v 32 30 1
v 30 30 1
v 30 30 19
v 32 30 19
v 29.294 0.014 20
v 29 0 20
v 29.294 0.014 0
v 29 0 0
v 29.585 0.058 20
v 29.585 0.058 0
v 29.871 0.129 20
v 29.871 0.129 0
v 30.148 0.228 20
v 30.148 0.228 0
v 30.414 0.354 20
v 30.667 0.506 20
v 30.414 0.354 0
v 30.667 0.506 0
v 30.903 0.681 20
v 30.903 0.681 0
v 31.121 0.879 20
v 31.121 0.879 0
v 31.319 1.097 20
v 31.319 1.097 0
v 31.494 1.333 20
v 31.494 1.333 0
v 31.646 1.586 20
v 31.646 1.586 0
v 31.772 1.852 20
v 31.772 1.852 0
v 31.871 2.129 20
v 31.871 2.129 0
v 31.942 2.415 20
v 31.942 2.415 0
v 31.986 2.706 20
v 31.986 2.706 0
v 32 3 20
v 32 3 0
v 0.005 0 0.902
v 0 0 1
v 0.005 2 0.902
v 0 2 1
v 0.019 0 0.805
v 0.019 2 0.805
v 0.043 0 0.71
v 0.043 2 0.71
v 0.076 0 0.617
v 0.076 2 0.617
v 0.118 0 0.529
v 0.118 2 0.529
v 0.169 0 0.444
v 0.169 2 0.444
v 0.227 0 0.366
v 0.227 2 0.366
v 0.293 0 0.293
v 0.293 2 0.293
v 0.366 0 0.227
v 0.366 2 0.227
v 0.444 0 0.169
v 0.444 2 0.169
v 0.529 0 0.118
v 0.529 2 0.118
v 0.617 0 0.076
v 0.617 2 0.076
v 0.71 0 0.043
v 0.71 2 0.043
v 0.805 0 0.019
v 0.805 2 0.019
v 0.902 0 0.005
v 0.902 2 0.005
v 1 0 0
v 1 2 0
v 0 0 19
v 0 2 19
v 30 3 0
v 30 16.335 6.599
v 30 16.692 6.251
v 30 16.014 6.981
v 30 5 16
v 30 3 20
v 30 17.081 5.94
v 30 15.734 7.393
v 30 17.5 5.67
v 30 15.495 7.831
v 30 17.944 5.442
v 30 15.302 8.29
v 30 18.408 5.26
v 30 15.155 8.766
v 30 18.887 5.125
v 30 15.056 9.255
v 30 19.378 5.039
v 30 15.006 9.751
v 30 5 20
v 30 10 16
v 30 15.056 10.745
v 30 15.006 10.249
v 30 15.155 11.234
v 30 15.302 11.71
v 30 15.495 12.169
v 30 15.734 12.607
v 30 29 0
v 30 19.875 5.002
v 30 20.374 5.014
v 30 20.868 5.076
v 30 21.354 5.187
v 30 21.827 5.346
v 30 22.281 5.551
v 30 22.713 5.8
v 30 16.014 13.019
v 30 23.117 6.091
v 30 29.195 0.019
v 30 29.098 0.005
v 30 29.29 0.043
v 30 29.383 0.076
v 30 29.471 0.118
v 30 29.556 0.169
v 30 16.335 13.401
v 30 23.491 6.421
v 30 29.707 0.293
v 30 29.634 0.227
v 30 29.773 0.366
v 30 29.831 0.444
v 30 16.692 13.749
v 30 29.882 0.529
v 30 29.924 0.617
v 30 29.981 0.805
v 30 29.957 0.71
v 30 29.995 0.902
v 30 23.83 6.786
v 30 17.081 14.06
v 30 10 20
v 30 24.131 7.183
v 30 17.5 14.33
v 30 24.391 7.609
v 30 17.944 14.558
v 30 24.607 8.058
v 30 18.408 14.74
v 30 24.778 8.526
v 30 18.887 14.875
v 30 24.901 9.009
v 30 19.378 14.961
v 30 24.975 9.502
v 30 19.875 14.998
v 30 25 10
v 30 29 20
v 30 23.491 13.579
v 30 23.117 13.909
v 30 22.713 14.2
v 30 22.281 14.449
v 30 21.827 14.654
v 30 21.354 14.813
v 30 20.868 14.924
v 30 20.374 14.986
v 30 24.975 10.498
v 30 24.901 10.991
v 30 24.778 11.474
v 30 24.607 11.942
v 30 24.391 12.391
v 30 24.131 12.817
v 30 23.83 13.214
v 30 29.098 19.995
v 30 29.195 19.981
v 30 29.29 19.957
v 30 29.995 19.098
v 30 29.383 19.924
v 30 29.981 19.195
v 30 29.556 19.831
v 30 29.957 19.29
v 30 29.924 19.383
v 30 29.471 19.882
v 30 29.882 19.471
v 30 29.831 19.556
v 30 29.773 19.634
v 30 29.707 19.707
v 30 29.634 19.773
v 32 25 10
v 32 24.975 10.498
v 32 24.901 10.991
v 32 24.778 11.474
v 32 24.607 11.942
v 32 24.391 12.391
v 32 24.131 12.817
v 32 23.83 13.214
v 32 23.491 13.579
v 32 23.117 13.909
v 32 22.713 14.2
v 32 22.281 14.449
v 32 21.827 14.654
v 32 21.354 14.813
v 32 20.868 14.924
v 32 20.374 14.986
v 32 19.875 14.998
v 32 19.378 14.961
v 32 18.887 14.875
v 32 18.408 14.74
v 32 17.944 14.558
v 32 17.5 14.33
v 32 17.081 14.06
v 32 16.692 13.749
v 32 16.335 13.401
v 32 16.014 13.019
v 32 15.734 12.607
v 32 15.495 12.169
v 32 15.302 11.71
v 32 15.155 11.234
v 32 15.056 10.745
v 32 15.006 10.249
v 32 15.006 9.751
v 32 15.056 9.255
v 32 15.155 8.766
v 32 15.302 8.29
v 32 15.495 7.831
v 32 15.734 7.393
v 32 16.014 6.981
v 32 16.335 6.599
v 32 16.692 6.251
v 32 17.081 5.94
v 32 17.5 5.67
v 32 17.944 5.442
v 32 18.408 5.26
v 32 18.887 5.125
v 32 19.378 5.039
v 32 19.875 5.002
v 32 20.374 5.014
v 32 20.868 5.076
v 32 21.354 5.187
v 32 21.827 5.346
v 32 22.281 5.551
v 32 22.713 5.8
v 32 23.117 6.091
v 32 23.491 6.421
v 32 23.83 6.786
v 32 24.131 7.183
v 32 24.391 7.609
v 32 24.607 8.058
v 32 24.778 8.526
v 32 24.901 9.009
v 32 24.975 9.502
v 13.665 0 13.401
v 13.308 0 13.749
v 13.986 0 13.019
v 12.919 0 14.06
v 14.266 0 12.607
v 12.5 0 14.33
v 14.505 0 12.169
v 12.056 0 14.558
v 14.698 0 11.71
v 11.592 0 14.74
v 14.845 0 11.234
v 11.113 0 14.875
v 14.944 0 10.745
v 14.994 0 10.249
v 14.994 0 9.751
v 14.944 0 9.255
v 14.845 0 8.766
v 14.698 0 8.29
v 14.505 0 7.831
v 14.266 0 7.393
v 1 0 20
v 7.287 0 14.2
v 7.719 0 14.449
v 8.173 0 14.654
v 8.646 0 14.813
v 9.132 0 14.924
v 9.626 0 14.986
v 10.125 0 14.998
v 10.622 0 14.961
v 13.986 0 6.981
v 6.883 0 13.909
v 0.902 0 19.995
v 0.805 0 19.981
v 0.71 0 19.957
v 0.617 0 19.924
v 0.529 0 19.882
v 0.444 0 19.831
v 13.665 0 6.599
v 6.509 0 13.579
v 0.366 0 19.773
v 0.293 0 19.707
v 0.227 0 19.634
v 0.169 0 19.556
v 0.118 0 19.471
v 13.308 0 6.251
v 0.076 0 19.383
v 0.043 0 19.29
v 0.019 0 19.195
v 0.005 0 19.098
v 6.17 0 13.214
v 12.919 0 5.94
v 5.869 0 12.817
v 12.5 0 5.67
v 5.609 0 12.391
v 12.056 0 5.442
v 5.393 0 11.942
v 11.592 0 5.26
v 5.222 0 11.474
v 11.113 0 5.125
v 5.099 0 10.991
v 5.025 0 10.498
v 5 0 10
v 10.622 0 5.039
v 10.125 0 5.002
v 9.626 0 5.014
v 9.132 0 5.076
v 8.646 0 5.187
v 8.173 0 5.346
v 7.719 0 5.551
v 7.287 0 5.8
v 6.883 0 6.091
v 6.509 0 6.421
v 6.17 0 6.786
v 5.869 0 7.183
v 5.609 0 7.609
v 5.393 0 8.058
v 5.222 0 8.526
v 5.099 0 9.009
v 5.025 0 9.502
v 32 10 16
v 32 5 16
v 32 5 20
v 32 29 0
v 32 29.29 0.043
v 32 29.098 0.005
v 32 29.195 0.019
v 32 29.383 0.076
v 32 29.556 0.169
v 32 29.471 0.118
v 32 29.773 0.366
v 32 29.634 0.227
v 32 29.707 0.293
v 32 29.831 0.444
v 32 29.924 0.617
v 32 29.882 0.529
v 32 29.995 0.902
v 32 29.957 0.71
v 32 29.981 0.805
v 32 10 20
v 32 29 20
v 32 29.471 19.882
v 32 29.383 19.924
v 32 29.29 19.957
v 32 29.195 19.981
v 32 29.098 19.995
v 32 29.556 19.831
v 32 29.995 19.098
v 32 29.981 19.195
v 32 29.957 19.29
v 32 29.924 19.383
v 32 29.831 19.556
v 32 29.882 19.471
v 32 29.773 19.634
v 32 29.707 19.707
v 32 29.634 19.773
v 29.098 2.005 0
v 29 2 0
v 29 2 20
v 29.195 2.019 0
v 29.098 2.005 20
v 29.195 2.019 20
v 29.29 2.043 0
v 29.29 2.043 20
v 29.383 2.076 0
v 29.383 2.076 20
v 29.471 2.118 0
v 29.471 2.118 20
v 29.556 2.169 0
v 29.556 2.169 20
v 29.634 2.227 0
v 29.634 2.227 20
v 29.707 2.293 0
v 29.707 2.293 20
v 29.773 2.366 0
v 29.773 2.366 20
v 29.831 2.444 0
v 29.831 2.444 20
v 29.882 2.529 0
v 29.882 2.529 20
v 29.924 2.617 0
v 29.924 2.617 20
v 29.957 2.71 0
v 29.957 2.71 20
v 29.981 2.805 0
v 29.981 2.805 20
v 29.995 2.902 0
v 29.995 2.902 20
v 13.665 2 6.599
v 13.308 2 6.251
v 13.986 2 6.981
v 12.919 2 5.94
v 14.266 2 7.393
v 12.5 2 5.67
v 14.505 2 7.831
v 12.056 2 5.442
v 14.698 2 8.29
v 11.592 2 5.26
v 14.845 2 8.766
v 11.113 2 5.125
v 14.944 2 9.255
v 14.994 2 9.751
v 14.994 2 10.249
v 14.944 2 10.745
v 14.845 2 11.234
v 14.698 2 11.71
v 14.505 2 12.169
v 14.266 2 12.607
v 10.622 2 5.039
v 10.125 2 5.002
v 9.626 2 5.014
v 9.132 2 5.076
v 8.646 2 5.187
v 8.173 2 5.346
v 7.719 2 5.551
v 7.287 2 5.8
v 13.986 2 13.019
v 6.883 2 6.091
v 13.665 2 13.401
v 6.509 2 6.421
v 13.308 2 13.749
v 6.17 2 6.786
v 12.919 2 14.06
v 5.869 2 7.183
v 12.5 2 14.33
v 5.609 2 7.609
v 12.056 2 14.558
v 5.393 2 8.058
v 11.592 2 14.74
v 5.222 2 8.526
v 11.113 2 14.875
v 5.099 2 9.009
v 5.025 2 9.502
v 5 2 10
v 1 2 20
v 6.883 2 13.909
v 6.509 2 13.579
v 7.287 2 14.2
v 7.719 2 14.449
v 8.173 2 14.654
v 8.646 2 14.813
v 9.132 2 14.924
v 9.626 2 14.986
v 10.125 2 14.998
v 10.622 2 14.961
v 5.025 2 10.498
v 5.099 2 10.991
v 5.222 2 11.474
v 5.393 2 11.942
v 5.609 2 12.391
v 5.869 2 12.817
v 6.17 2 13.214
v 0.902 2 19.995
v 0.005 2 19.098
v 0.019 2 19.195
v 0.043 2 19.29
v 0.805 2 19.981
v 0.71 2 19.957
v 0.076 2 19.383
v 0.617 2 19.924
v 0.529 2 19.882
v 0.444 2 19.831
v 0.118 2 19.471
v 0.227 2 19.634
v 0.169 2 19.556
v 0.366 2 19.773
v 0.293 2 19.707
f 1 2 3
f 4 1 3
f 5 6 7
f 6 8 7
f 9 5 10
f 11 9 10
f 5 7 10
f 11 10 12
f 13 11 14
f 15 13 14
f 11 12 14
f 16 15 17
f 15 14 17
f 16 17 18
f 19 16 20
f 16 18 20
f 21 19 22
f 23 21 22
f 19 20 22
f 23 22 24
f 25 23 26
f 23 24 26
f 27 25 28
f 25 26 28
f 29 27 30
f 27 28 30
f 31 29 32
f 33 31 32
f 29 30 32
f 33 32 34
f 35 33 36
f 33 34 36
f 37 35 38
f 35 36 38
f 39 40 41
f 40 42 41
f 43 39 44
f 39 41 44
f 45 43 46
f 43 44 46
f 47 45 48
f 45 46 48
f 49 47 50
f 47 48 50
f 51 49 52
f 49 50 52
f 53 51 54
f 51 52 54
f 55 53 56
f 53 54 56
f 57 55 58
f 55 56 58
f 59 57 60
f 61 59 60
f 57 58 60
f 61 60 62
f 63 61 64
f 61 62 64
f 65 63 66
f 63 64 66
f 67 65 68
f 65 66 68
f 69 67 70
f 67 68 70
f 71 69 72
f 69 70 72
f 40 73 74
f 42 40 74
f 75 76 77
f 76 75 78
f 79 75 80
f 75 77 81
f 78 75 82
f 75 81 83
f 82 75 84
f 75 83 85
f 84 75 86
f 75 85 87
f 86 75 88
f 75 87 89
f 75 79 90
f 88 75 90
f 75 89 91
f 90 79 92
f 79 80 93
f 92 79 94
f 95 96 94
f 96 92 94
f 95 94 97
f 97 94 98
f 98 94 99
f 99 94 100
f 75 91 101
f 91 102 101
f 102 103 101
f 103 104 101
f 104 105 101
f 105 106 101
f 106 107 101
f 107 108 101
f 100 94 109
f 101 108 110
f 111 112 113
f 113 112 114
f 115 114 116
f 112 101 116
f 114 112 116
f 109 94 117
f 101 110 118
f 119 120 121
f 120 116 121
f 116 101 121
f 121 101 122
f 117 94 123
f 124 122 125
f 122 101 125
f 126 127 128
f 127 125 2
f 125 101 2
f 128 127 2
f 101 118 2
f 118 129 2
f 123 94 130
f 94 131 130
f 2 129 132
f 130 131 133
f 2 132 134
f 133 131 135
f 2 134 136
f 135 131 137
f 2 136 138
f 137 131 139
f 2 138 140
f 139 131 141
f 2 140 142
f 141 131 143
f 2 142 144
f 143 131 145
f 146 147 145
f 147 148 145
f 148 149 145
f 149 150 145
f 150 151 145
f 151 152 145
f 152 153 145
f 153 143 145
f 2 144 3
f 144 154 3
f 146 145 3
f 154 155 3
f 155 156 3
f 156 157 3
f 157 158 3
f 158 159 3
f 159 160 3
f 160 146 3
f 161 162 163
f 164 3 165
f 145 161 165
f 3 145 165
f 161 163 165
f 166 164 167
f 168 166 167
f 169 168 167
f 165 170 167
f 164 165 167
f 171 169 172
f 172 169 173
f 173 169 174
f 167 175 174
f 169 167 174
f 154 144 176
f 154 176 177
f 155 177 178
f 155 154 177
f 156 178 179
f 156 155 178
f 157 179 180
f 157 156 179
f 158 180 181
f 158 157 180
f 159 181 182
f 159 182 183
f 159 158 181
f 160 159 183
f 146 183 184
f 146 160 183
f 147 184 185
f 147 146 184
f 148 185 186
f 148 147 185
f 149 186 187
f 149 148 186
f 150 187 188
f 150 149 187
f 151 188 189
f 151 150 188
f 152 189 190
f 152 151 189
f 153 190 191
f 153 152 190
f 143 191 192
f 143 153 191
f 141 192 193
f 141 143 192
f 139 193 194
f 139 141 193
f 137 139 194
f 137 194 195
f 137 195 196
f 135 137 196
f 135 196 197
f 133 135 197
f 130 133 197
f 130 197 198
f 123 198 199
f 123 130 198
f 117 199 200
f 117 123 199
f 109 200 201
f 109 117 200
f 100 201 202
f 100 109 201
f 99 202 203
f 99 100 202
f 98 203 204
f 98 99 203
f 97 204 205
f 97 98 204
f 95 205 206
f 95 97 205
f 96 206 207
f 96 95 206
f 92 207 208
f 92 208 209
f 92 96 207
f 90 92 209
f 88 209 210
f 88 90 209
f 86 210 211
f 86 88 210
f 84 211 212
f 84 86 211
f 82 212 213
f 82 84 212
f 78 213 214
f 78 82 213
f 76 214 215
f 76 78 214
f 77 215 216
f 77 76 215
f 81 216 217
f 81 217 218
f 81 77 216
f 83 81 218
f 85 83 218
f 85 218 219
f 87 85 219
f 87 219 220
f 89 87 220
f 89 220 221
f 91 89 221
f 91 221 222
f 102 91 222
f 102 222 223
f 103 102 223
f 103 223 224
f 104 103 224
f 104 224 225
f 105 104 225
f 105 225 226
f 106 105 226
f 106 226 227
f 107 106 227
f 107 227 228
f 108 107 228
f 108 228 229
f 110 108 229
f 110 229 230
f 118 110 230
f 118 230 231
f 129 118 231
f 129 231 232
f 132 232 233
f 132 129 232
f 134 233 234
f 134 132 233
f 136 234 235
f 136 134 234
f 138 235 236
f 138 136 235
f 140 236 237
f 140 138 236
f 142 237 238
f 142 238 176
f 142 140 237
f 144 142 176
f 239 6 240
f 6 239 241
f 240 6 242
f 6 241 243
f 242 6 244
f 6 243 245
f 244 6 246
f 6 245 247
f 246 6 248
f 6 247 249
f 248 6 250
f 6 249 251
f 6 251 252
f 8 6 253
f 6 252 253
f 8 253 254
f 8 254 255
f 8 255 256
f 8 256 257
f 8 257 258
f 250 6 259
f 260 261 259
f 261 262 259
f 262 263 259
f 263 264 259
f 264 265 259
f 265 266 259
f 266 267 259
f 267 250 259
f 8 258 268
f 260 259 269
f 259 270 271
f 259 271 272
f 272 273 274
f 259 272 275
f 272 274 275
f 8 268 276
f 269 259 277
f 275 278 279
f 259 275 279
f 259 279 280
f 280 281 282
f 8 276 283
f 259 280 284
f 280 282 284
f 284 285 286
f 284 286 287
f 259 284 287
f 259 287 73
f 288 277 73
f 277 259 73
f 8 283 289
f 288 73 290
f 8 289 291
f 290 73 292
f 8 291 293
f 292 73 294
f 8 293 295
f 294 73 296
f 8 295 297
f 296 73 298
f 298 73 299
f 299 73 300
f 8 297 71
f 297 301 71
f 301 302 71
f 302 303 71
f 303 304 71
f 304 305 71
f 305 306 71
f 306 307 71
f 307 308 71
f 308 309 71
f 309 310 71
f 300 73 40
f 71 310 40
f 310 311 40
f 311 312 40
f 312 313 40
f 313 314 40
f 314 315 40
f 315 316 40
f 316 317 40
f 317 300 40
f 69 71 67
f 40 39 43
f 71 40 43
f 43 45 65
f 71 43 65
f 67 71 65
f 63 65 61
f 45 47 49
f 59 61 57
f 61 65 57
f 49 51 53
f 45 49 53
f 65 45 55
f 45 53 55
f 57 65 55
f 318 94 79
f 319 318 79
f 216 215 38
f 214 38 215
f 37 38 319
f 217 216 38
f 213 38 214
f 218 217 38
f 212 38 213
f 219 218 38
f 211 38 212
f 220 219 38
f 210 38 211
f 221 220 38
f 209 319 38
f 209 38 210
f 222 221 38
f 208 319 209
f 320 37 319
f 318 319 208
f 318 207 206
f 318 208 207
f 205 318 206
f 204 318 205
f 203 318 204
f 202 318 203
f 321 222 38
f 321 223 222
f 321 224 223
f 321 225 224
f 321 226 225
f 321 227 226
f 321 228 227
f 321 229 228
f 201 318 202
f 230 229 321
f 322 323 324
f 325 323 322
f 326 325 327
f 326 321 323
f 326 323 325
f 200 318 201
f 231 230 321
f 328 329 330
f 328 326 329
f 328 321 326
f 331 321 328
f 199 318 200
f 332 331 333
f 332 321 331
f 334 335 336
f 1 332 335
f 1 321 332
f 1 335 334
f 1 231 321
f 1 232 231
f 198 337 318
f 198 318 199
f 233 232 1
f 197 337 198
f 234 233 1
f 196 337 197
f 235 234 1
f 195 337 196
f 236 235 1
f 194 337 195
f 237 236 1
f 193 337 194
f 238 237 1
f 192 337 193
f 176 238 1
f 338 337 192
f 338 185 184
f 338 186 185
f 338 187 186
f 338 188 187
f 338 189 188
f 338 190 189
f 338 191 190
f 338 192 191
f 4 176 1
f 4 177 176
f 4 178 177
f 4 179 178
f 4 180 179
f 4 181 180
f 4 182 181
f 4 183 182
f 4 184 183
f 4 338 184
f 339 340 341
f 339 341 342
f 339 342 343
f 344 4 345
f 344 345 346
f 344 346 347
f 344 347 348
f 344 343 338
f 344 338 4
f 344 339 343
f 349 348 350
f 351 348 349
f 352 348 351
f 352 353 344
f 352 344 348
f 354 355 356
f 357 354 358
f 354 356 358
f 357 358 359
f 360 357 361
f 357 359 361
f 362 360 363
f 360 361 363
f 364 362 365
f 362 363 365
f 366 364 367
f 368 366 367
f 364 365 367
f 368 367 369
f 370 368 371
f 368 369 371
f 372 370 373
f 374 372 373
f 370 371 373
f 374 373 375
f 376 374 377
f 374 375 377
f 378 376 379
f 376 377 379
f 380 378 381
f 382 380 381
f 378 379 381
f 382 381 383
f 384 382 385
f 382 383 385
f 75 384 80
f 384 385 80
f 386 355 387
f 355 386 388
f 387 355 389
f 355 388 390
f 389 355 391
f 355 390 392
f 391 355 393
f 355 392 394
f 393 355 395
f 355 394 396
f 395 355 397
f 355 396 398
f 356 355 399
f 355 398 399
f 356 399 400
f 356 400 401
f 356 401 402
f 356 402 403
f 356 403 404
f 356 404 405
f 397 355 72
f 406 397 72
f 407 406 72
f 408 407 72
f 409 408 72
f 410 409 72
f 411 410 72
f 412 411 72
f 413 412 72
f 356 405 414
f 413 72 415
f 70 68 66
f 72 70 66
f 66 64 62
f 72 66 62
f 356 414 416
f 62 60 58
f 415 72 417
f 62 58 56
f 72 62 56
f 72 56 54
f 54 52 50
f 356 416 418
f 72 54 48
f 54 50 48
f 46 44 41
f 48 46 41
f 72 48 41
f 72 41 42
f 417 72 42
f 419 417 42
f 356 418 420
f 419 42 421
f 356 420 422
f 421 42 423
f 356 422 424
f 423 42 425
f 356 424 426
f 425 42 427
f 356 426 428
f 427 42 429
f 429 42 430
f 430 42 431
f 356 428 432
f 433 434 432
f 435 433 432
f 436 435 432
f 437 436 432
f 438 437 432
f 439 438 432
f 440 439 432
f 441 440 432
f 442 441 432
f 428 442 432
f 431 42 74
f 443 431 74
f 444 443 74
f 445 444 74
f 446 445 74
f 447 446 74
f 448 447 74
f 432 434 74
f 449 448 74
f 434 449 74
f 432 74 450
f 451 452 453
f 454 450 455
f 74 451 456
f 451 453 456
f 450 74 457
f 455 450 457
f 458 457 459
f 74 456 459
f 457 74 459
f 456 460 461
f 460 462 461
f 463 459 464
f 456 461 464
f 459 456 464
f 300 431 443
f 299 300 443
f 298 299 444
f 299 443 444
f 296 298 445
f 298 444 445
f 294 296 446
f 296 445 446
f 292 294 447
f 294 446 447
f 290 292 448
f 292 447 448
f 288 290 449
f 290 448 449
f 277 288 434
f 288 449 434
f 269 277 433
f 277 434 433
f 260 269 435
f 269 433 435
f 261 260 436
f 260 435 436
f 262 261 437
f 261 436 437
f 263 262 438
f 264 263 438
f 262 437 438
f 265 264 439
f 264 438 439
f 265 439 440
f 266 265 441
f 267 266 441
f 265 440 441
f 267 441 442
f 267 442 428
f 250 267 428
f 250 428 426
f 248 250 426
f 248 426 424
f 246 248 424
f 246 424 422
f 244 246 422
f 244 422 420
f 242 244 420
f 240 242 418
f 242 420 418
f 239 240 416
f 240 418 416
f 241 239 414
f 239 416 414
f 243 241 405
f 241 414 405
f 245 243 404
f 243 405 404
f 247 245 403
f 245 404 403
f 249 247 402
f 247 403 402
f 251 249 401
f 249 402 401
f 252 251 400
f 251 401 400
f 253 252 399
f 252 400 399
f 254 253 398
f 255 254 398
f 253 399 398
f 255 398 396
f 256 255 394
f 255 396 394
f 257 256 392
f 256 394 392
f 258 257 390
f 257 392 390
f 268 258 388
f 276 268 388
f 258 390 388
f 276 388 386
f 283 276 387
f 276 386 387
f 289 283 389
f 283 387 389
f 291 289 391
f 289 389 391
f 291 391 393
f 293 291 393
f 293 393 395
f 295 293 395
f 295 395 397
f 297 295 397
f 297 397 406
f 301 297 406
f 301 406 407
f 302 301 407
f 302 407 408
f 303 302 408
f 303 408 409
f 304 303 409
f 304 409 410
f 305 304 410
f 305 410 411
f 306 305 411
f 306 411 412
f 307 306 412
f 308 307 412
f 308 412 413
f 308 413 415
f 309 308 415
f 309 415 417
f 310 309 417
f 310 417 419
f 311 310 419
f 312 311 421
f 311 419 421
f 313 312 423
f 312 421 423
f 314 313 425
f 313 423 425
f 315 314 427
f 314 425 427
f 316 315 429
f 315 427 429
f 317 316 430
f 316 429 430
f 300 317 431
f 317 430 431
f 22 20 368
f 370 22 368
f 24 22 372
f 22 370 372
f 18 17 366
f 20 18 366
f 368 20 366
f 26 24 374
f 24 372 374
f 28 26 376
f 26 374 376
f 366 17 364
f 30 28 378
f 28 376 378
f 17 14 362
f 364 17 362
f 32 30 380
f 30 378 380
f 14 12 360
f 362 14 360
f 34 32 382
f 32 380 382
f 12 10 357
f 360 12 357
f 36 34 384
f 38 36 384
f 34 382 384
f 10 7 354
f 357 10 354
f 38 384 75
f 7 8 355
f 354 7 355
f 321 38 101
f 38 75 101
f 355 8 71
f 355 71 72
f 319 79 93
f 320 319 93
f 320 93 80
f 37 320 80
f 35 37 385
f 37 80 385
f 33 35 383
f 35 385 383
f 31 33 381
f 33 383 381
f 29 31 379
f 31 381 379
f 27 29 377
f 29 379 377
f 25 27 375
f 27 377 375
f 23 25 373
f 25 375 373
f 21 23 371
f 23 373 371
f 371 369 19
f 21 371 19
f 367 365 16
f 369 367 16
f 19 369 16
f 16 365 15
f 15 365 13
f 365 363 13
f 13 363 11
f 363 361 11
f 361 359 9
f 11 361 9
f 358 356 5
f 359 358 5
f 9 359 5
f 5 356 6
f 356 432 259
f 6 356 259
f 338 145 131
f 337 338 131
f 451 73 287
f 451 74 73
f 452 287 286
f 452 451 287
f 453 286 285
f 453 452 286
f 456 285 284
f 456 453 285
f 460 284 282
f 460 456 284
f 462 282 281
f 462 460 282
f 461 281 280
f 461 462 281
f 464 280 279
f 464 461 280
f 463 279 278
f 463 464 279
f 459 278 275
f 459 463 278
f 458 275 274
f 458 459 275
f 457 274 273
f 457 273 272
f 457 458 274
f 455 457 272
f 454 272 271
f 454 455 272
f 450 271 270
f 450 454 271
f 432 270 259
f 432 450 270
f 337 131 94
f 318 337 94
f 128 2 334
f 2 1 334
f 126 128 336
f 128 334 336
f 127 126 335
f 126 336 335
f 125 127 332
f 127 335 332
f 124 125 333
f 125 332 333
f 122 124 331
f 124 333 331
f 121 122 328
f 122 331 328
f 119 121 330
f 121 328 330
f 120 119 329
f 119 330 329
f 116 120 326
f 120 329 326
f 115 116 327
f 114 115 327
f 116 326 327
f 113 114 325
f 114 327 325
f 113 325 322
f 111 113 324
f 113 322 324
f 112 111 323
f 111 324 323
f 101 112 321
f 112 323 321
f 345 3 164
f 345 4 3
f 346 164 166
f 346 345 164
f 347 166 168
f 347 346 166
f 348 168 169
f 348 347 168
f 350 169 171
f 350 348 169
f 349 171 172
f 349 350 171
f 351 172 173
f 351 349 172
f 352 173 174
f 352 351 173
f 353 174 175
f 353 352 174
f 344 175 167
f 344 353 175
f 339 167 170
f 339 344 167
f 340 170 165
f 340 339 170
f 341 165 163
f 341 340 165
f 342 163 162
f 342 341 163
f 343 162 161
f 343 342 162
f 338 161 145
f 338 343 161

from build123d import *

# Parameters (mm, degrees)
F0_W     = 2
F0_H     = 20
F1_DEPTH = 30
F2_R     = 5
F3_DEPTH = 2
F4_R     = 5
F5_DEPTH = 2
F6_R     = 1
F7_R     = 3


with BuildPart() as f1:
    # F0 (on Right) → F1 (new body)
    with BuildSketch(Plane.YZ):
        with Locations((1, 10)):
            Rectangle(F0_W, F0_H)
    extrude(amount=F1_DEPTH)

    # F2 (on face) → F3 (cut)
    with BuildSketch(Plane(origin=(0, 2, 0), x_dir=(-1, 0, 0), z_dir=(0, 1, 0))):
        with Locations((-10, 10)):
            Circle(F2_R)
    extrude(amount=-F3_DEPTH, mode=Mode.SUBTRACT)

    # F4 (on face) → F5 (join)
    with BuildSketch(Plane.YZ.offset(30)):
        Polygon((0, 20), (0, 0), (30, 0), (30, 20), (10, 20), (10, 16), (5, 16), (5, 20), align=None)
        with Locations((20, 10)):
            Circle(F4_R, mode=Mode.SUBTRACT)
    extrude(amount=F5_DEPTH)

    # F6
    f6_edges = [f1.edges().sort_by_distance(p)[0] for p in [
        (30, 2, 10),
        (31, 30, 0),
        (0, 1, 20),
        (0, 1, 0),
        (31, 30, 20),
    ]]
    fillet(f6_edges, radius=F6_R)

    # F7
    f7_edges = [f1.edges().sort_by_distance(p)[0] for p in [
        (32, 0, 10),
    ]]
    fillet(f7_edges, radius=F7_R)


solid = f1.part
